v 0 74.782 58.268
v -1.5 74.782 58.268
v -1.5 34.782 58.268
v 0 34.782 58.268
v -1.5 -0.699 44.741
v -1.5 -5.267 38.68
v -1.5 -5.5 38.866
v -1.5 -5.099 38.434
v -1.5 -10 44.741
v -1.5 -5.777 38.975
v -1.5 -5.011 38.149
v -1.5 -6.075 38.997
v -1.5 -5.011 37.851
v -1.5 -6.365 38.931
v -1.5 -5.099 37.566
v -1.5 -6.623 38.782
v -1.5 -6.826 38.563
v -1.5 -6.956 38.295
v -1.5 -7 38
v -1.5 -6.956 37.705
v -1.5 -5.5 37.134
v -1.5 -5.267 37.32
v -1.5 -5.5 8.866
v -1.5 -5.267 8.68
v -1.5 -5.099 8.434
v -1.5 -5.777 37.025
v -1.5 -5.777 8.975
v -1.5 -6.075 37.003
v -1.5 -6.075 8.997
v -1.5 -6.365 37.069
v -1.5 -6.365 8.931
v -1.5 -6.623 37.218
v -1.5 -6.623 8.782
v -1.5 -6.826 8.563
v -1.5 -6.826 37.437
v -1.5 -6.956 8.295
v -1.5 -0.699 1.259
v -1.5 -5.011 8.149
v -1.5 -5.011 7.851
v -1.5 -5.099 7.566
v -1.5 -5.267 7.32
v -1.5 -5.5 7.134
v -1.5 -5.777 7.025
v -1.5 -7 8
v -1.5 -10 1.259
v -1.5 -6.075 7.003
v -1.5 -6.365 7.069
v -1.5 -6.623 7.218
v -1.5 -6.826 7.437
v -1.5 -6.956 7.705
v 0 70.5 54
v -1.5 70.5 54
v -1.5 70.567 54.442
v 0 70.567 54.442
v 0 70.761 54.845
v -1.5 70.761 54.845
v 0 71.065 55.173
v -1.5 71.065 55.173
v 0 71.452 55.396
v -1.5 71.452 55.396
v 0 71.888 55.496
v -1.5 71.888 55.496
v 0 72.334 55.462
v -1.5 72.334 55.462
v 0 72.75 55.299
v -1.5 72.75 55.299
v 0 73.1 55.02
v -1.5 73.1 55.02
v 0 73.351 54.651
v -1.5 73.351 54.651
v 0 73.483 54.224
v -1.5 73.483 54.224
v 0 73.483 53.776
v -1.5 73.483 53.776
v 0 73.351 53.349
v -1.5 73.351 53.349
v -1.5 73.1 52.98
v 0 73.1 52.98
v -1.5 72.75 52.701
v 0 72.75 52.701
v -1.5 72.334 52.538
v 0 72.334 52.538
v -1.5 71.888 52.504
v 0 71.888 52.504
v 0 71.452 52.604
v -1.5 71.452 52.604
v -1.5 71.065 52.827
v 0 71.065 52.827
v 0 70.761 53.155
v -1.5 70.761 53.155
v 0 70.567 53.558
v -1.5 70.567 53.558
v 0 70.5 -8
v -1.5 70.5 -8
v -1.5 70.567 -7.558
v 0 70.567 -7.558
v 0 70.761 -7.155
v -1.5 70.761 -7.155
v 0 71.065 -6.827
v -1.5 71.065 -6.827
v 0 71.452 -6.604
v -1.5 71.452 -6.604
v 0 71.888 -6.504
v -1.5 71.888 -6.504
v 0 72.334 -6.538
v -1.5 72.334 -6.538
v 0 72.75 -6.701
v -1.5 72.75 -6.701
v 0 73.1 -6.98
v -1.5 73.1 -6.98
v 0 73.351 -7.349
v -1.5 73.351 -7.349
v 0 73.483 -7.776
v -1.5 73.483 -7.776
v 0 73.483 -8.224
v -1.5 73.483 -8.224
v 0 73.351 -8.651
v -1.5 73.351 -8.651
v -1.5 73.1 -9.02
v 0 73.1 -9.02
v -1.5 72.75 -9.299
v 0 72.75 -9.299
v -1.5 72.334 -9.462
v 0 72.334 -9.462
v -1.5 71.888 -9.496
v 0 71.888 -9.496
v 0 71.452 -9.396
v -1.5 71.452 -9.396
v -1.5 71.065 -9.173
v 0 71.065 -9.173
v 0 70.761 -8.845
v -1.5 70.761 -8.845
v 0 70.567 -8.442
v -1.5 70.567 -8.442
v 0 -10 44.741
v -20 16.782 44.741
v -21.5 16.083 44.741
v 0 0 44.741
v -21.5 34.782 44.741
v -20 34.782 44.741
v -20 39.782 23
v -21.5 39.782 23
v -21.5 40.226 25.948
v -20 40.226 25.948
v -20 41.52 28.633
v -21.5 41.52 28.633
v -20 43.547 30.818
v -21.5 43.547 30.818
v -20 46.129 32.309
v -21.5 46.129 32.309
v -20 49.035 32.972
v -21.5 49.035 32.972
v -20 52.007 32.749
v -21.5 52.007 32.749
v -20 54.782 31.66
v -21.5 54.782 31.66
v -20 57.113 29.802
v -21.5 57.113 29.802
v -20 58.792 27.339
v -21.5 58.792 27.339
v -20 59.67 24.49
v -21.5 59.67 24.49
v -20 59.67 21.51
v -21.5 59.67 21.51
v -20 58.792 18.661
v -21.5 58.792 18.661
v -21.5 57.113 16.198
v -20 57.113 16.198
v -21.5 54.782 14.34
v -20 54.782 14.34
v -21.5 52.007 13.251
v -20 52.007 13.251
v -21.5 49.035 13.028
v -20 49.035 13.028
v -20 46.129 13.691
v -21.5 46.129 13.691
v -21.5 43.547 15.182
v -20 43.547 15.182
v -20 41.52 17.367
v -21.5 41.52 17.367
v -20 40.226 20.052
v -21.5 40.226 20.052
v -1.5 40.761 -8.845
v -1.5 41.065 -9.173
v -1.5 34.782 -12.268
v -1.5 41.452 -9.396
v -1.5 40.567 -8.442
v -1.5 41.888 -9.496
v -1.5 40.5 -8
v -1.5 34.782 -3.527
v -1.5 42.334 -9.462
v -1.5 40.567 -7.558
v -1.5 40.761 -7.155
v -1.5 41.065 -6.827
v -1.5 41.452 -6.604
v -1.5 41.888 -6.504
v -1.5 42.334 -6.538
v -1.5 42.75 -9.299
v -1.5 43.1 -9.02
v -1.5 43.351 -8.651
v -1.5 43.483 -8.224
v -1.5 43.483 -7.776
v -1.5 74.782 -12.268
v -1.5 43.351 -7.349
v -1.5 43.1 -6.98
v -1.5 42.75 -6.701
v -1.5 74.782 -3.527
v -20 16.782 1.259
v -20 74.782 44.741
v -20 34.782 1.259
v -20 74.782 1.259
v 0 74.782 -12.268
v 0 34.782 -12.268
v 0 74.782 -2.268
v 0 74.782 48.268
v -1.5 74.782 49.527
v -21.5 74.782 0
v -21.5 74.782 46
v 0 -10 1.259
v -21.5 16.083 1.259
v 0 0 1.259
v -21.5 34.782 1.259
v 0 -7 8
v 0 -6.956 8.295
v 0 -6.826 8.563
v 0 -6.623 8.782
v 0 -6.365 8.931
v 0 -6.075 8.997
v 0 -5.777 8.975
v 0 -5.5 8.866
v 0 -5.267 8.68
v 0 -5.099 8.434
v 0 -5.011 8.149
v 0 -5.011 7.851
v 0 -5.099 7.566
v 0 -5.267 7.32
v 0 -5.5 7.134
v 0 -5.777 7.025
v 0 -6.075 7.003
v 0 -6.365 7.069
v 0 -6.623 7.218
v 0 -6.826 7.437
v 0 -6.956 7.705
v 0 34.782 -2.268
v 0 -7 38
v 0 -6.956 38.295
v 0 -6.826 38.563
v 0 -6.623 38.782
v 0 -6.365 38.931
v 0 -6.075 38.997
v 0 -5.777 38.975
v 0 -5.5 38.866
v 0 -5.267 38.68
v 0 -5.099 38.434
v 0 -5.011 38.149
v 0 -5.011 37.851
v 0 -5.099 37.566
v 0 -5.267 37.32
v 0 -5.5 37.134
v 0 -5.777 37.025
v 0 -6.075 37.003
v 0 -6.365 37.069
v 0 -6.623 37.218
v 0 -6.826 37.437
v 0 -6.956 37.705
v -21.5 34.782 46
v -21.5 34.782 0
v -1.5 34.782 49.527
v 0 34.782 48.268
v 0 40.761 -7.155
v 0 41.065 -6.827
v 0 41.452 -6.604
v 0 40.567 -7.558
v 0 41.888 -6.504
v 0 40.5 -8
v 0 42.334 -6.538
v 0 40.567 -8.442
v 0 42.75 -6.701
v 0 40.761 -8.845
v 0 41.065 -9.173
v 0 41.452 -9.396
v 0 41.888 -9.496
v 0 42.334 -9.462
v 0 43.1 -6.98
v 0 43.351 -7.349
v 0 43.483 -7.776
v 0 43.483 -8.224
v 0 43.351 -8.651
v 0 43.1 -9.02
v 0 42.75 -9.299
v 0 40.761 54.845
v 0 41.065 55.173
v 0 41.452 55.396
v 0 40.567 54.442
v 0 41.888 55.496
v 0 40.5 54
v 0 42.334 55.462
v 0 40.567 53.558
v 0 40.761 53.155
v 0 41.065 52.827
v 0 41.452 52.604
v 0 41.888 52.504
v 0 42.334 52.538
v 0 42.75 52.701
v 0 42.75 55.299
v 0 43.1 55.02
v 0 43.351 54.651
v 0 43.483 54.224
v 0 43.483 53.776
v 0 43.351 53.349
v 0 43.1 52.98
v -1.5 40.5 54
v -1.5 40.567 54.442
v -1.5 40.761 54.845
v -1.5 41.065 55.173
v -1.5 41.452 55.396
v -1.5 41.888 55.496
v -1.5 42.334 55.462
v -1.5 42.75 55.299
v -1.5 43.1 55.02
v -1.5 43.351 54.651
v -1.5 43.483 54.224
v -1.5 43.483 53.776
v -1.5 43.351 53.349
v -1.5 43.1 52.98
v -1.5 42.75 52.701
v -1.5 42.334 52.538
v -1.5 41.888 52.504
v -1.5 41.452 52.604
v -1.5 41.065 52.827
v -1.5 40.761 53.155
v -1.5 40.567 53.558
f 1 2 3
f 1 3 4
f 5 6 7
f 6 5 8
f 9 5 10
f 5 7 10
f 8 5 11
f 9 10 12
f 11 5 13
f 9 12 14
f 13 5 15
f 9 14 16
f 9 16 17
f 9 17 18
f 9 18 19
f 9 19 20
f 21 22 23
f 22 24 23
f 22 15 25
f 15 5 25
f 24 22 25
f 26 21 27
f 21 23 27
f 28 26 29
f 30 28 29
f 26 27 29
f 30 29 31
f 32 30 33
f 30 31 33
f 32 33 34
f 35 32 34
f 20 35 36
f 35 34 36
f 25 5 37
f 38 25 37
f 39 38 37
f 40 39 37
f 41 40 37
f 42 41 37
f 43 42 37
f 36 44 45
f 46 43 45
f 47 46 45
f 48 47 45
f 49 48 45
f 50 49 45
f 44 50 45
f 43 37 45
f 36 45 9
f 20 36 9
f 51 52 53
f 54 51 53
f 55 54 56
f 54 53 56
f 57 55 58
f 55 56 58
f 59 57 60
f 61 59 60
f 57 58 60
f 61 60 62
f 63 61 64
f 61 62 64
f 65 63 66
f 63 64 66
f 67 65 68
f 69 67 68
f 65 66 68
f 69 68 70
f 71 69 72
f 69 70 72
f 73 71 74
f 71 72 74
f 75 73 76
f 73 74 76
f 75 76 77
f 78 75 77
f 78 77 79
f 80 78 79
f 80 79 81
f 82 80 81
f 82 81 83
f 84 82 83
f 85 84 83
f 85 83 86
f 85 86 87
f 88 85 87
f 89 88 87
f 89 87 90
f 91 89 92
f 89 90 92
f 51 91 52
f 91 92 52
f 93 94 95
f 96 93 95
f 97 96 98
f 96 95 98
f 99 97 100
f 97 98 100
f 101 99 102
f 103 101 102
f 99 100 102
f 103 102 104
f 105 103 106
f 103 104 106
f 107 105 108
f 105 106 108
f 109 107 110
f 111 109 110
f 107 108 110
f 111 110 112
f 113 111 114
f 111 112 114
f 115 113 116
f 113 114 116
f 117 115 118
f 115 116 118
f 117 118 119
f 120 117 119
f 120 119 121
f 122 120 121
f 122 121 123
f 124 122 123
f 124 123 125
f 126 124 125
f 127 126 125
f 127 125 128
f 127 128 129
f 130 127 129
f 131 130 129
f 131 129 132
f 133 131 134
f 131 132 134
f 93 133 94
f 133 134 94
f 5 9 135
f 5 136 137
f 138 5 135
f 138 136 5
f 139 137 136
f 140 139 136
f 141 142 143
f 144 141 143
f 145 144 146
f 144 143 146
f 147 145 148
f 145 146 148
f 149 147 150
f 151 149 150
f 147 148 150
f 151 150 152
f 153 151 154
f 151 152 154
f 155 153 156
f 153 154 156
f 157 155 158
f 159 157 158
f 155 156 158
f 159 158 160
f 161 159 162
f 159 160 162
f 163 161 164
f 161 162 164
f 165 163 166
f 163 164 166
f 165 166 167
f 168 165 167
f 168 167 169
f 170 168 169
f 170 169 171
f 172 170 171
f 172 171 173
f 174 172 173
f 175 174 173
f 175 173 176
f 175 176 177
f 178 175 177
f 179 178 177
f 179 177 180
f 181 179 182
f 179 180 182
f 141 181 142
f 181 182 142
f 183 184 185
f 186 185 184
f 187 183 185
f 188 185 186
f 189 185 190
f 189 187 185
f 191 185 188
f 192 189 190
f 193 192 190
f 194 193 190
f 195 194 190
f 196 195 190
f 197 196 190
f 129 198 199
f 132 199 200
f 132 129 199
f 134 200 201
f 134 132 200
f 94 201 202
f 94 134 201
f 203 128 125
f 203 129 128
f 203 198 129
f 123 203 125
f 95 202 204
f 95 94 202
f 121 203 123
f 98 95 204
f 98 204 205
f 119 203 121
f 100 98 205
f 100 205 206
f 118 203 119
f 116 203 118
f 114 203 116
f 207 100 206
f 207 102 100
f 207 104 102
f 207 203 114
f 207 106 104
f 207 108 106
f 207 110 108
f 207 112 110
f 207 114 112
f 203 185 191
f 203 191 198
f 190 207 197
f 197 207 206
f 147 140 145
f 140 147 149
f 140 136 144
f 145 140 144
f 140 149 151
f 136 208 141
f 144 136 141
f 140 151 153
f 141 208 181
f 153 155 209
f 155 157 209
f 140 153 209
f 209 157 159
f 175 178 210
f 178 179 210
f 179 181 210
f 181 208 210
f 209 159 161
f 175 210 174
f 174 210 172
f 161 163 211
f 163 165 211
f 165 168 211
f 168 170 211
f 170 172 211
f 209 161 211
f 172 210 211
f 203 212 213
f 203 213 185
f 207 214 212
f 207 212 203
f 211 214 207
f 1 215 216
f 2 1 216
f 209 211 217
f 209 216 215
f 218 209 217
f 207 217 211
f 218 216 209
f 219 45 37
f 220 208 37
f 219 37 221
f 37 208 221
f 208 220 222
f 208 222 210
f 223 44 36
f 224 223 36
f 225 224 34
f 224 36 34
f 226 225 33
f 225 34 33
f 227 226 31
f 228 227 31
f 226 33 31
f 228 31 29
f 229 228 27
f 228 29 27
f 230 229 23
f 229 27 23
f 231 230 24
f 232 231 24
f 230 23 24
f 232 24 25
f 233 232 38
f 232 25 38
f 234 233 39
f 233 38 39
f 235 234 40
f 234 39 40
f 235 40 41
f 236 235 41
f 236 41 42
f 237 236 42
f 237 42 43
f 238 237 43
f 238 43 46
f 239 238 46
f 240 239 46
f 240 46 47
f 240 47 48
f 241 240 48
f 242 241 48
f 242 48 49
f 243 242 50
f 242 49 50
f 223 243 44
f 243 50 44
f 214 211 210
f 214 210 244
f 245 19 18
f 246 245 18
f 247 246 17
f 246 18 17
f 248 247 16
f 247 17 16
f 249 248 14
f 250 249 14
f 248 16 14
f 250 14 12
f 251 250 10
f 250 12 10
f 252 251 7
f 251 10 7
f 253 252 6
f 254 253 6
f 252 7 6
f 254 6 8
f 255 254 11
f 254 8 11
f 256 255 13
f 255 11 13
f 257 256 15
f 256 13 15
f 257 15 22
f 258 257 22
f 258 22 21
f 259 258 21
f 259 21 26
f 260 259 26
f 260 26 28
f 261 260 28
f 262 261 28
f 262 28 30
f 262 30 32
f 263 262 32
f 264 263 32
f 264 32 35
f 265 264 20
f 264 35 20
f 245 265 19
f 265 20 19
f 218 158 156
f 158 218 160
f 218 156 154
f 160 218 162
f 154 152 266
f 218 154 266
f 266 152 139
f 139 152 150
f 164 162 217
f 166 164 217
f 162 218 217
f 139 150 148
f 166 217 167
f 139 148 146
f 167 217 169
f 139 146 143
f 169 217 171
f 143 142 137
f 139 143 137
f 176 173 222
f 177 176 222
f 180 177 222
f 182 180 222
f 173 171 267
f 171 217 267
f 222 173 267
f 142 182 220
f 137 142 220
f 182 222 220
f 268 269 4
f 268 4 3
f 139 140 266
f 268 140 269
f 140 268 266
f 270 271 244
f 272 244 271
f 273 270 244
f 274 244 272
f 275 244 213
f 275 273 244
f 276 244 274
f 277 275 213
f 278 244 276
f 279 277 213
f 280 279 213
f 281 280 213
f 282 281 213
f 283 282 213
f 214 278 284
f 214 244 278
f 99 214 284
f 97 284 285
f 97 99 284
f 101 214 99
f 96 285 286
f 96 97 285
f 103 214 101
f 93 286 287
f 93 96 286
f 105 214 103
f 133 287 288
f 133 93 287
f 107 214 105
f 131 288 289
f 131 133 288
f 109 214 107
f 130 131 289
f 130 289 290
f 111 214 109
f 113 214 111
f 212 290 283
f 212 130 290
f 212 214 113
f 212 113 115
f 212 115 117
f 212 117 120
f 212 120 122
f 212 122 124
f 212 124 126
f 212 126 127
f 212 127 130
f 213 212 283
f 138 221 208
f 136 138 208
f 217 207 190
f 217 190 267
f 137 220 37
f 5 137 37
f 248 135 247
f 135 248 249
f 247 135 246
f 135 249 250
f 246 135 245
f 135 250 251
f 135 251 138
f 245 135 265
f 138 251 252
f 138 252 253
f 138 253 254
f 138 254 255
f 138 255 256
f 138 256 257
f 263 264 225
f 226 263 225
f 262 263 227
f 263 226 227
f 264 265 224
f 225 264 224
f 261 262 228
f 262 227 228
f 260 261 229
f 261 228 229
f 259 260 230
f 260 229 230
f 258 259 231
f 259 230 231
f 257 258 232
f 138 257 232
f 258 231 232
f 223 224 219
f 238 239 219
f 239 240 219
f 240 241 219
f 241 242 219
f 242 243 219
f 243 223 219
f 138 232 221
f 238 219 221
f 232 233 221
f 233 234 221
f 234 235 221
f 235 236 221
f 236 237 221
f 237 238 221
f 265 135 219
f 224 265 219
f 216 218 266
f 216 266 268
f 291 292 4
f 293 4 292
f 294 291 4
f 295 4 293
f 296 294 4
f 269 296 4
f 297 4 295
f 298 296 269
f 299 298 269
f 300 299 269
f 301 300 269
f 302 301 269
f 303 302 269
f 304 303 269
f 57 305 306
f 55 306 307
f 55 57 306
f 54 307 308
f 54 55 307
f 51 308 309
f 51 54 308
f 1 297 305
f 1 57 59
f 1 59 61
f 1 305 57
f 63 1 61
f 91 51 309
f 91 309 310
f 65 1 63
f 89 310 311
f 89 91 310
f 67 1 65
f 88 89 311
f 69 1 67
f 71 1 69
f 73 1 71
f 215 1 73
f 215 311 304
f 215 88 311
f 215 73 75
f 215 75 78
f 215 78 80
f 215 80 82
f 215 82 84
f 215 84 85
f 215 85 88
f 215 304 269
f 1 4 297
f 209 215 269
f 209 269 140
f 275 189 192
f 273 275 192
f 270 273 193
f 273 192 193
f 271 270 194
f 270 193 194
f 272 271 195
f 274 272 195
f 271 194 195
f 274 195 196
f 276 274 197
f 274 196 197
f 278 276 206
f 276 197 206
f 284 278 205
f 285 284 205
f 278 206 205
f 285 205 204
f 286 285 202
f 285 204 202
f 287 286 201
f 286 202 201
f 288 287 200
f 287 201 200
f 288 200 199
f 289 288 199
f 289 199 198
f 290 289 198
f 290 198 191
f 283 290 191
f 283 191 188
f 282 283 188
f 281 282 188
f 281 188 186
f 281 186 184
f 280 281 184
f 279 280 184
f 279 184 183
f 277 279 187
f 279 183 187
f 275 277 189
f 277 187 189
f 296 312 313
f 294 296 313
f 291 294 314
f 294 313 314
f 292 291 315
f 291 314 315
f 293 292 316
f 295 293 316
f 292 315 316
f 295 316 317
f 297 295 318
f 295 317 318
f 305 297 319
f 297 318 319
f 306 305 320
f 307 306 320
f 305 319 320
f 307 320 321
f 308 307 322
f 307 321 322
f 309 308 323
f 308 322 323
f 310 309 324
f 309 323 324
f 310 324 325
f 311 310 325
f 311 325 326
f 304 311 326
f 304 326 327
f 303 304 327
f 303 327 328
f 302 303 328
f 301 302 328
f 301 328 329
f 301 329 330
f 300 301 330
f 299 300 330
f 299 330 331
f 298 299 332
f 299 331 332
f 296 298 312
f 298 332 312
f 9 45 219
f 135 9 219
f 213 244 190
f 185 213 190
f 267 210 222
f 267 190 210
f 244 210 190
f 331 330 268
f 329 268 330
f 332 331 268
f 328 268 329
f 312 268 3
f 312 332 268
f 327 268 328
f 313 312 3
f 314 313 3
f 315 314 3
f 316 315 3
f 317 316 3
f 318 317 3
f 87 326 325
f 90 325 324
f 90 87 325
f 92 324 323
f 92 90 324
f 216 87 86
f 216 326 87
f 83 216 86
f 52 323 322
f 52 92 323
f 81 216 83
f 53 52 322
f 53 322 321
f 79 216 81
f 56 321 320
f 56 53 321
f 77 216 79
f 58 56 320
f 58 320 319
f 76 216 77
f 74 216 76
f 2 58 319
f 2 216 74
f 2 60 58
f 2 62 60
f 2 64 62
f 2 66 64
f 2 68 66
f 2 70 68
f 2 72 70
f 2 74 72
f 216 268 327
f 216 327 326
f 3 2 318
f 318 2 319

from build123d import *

# Parameters (mm, degrees)
F1_DEPTH  = 46
F2_R      = 1
F3_DEPTH  = 1.5
F5_DEPTH  = 40
F6_R      = 1.5
F7_DEPTH  = 1.5
F8_R      = 10
F9_DEPTH  = 1.5
F10_DEPTH = 1.259
F11_DEPTH = 1.259


with BuildPart() as f1:
    # F0 (on Top) → F1 (new body)
    with BuildSketch(Plane.XY):
        Polygon((-20, 74.7819926235), (-21.5, 74.7819926235), (-21.5, 16.0825311363), (-1.5, -0.6994614872), (-1.5, -10), (0, -10), (0, 0), (-20, 16.7819926235), align=None)
    extrude(amount=F1_DEPTH)

    # F2 (on face) → F3 (cut, through all)
    with BuildSketch(Plane(origin=(-1.5, 0, 0), x_dir=(0, -1, 0), z_dir=(-1, 0, 0))):
        with Locations((6, 8)):
            Circle(F2_R)
        with Locations((6, 38)):
            Circle(F2_R)
    extrude(amount=-F3_DEPTH, mode=Mode.SUBTRACT)

    # F4 (on face) → F5 (join)
    with BuildSketch(Plane(origin=(0, 74.7819926235, 0), x_dir=(-1, 0, 0), z_dir=(0, 1, 0))):
        Polygon((0, 58.2678901674), (0, 48.2678901674), (20, 44.7413505532), (21.5, 44.7413505532), (21.5, 46), (1.5, 49.5265396142), (1.5, 58.2678901674), align=None)
        Polygon((21.5, 1.2586494468), (20, 1.2586494468), (0, -2.2678901674), (0, -12.2678901674), (1.5, -12.2678901674), (1.5, -3.5265396142), (21.5, 0), align=None)
    extrude(amount=-F5_DEPTH)

    # F6 (on face) → F7 (cut, through all)
    with BuildSketch(Plane(origin=(-1.5, 0, 0), x_dir=(0, -1, 0), z_dir=(-1, 0, 0))):
        with Locations((-71.9999926235, -8)):
            Circle(F6_R)
        with Locations((-41.9999926235, -8)):
            Circle(F6_R)
        with Locations((-41.9999926235, 54)):
            Circle(F6_R)
        with Locations((-71.9999926235, 54)):
            Circle(F6_R)
    extrude(amount=-F7_DEPTH, mode=Mode.SUBTRACT)

    # F8 (on face) → F9 (cut, through all)
    with BuildSketch(Plane(origin=(-21.5, 0, 0), x_dir=(0, -1, 0), z_dir=(-1, 0, 0))):
        with Locations((-49.7819926235, 23)):
            Circle(F8_R)
    extrude(amount=-F9_DEPTH, mode=Mode.SUBTRACT)

    # F10 (cut): a face of the model
    f10_faces = [f1.faces().sort_by_distance(p)[0] for p in [
        (-10.3193093541, 8.0104582418, 0),
    ]]
    extrude(f10_faces, amount=-F10_DEPTH, mode=Mode.SUBTRACT)

    # F11 (cut): a face of the model
    f11_faces = [f1.faces().sort_by_distance(p)[0] for p in [
        (-10.3193093541, 8.0104582418, 46),
    ]]
    extrude(f11_faces, amount=-F11_DEPTH, mode=Mode.SUBTRACT)


solid = f1.part
